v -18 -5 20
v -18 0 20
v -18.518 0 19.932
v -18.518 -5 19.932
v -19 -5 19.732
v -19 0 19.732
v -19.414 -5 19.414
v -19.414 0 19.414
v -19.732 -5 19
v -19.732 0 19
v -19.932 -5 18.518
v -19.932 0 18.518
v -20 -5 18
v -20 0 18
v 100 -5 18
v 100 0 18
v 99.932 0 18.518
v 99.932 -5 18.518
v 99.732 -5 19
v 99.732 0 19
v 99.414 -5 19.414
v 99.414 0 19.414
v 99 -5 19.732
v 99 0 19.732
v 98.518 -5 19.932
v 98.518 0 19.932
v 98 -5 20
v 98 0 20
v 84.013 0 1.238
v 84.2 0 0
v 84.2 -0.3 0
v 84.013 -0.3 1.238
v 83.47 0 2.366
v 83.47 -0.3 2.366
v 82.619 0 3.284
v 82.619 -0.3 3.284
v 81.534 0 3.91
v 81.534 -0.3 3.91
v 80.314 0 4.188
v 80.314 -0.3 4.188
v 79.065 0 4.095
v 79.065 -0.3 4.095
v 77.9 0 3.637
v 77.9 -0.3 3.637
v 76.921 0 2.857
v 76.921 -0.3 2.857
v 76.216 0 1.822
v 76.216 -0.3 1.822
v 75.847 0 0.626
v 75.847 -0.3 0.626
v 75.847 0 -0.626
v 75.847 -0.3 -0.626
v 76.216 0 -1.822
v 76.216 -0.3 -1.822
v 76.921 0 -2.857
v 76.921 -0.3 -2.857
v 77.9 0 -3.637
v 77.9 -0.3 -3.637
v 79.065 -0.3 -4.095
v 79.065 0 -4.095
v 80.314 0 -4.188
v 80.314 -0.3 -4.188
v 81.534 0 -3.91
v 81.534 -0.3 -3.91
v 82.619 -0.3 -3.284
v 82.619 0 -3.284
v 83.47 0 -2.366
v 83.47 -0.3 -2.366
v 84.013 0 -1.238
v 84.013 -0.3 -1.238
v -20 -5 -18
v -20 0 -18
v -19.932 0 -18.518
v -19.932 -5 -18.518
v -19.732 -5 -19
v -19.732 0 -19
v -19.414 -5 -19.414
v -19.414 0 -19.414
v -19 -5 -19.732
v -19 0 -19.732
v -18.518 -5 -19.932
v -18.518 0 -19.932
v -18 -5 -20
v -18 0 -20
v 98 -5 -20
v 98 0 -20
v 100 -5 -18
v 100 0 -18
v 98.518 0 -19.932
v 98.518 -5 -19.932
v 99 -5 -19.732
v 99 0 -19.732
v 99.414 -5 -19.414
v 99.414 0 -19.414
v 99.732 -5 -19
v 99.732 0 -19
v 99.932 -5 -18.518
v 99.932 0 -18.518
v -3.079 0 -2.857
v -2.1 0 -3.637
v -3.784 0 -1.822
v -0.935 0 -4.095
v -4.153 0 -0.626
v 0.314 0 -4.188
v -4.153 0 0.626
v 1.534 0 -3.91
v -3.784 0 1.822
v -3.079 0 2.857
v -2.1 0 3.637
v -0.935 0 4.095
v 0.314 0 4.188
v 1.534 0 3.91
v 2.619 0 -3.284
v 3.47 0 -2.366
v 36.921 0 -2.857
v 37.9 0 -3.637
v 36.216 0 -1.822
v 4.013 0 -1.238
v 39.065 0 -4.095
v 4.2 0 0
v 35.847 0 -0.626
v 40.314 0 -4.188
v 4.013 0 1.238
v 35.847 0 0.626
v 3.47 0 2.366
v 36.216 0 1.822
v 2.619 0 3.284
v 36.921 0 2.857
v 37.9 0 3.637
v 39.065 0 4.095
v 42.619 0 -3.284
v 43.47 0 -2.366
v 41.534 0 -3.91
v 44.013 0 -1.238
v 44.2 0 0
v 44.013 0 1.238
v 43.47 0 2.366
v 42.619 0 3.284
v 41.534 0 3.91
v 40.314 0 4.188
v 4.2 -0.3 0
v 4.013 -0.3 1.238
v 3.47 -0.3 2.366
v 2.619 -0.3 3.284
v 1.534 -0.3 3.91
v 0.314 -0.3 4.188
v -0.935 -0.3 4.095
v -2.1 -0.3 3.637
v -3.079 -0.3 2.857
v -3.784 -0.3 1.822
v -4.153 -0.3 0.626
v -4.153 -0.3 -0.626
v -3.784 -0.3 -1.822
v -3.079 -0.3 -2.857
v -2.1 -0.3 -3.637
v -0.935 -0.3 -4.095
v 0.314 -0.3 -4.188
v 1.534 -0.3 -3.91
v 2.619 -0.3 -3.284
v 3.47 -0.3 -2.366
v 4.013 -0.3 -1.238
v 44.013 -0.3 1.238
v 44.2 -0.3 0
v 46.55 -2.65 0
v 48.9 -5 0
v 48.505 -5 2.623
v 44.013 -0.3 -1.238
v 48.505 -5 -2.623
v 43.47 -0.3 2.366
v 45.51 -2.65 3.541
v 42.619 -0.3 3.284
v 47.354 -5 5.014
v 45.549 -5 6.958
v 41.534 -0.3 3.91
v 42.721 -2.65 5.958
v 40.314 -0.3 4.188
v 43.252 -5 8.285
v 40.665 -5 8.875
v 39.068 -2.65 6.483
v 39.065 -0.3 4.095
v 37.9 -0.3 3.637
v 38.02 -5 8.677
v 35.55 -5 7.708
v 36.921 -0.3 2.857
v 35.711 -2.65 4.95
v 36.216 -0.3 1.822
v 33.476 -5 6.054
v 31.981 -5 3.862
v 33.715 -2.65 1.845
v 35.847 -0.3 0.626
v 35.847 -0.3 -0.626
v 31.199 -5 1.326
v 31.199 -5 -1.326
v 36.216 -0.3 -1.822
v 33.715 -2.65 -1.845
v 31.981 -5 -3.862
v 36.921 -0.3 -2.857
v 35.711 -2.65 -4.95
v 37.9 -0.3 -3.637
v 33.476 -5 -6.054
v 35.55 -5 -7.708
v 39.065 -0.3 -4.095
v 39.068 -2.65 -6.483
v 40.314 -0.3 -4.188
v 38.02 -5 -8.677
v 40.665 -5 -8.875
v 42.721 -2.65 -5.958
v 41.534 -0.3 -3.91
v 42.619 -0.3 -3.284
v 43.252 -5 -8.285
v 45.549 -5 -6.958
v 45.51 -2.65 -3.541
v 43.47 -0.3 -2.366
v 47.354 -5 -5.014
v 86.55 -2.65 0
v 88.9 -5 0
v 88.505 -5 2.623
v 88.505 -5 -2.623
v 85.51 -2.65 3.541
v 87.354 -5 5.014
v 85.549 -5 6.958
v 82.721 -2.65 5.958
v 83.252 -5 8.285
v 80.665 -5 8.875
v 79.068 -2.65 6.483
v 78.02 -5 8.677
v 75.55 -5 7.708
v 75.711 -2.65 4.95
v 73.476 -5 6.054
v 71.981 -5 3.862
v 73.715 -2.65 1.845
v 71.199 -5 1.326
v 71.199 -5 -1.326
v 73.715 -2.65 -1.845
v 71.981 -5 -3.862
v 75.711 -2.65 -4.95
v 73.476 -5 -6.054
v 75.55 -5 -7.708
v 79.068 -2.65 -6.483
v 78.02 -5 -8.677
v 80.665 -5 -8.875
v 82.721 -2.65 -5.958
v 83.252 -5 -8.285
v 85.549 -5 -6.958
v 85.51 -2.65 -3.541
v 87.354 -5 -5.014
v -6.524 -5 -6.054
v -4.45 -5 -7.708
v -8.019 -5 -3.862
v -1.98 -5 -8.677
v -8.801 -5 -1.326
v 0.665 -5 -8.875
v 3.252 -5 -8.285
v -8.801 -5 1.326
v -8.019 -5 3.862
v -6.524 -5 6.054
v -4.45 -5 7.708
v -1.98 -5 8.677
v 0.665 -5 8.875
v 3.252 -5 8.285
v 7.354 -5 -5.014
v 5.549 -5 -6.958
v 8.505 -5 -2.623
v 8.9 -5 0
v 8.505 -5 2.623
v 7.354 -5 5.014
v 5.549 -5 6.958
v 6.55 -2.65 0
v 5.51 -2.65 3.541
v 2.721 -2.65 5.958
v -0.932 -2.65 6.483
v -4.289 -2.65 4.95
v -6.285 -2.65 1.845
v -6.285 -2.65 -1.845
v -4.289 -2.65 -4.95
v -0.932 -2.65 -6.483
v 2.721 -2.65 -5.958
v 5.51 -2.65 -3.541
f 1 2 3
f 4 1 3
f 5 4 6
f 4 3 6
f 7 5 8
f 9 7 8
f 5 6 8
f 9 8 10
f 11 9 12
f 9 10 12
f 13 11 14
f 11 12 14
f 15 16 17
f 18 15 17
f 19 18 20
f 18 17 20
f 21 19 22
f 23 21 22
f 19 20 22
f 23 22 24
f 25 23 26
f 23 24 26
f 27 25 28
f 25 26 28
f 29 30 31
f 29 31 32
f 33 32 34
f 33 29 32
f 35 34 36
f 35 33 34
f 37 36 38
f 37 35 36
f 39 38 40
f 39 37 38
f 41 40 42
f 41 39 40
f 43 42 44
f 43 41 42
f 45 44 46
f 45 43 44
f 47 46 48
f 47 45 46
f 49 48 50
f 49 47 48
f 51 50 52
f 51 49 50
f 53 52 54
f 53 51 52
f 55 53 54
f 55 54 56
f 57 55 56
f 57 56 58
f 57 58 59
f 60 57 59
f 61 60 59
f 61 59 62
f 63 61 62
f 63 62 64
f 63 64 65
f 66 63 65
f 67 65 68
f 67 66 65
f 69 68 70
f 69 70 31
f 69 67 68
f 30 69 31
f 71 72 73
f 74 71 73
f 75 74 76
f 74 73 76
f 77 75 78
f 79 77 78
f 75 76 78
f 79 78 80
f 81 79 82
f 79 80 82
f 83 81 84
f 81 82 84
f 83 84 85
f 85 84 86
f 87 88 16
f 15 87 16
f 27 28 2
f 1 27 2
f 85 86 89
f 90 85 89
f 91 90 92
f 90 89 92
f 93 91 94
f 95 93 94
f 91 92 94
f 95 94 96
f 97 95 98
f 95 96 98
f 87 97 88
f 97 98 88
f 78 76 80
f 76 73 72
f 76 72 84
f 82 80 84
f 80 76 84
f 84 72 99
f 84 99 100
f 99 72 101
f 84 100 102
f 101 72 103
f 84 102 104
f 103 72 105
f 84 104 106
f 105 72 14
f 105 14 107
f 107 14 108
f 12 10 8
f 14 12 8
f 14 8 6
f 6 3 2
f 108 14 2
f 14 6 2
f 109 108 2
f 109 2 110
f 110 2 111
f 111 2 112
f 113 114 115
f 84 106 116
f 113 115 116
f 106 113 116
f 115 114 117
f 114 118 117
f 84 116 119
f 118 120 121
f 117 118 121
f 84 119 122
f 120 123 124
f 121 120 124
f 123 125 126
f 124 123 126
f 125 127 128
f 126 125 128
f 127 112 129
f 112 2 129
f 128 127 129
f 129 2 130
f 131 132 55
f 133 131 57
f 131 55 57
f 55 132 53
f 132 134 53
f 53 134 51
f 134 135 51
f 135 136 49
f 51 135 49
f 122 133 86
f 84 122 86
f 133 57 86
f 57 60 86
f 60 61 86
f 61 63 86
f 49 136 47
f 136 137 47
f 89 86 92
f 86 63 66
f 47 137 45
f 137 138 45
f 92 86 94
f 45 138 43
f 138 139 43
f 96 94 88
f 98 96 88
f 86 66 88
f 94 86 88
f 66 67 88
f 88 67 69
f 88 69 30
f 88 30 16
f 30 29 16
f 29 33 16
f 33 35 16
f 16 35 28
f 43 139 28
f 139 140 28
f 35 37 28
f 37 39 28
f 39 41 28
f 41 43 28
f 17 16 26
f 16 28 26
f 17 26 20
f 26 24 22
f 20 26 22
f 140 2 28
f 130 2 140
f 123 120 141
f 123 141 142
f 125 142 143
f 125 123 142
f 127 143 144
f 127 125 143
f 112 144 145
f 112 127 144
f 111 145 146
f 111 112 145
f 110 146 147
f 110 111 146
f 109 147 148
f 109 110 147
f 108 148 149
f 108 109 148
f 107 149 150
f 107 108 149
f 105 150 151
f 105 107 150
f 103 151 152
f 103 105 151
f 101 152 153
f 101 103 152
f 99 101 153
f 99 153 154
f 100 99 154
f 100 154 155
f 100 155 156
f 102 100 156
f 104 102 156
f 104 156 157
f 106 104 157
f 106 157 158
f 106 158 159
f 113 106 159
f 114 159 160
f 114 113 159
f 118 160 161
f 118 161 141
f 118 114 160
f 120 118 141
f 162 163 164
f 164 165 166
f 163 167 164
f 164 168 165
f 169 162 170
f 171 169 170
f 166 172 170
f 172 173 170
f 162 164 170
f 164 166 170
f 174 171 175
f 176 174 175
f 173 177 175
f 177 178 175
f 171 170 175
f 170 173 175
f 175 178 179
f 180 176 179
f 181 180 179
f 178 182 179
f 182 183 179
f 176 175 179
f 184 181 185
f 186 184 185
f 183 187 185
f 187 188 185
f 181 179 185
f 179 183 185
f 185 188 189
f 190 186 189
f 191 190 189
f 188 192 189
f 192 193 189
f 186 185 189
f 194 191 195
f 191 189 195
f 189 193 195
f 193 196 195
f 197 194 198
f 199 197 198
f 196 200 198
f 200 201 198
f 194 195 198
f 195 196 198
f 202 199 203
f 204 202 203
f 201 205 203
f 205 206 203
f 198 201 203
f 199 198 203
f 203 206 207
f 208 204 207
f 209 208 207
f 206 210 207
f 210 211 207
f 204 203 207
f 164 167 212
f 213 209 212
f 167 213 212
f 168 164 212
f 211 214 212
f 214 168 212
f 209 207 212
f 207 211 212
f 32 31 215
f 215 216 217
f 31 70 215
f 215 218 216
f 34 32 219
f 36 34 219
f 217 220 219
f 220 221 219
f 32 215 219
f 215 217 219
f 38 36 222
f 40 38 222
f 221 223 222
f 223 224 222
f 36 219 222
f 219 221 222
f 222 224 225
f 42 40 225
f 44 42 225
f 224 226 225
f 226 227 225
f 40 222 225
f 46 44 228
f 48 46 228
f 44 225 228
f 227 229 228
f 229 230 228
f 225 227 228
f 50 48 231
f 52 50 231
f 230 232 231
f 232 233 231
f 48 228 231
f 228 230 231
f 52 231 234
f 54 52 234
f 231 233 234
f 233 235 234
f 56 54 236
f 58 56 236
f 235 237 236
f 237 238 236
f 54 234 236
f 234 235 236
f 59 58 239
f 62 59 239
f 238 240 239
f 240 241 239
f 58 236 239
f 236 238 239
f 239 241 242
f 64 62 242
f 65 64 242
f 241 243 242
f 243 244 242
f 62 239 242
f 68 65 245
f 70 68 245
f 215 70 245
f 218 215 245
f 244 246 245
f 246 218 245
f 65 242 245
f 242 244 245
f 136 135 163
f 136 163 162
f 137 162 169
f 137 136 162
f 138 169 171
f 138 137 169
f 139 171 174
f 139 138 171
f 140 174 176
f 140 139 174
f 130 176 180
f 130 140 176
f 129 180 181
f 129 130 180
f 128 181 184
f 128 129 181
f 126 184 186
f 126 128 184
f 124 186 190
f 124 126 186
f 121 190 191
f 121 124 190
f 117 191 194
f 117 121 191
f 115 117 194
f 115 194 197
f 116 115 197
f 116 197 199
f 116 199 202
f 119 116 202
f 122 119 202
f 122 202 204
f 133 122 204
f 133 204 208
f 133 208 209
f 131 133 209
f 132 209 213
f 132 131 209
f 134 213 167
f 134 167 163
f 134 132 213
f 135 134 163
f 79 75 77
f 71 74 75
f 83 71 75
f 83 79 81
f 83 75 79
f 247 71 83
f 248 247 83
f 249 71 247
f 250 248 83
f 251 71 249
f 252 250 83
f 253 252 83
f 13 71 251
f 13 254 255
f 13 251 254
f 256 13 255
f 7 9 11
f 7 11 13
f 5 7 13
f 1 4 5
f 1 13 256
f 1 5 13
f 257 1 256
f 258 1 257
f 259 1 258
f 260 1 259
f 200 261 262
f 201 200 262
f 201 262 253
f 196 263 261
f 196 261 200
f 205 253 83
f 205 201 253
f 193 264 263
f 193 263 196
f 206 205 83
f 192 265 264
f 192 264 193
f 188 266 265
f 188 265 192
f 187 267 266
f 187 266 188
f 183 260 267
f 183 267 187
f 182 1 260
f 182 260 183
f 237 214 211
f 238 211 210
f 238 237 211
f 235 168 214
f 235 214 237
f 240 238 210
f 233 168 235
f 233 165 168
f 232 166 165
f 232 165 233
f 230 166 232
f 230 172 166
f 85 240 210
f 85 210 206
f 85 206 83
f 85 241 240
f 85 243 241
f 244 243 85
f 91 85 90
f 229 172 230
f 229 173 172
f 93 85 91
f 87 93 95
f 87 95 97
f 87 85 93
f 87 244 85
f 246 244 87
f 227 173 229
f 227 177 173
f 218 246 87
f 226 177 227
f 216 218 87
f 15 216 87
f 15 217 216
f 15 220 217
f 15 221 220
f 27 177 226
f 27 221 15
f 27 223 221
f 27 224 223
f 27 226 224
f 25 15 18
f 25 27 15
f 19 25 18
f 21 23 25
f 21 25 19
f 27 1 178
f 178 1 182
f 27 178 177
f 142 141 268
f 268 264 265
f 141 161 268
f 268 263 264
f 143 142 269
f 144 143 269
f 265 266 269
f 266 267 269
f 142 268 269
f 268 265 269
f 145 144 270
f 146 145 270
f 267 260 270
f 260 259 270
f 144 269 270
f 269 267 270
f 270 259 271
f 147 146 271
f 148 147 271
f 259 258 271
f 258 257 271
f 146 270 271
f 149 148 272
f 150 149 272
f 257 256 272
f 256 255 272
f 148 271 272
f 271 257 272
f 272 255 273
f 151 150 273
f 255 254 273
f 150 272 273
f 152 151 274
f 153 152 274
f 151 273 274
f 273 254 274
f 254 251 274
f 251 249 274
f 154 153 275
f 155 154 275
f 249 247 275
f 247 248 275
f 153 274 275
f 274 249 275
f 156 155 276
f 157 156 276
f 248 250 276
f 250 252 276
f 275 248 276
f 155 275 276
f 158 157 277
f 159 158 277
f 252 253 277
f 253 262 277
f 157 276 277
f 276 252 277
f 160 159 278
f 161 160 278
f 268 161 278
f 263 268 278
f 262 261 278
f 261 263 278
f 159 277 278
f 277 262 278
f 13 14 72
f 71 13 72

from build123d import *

# Parameters (mm, degrees)
F0_R     = 4.2
F1_DEPTH = 5
F2_SIZE  = 4.7


# Not quite as in the source:
# - a feature names something its author has since deleted; it is built from what else it names


with BuildPart() as f1:
    # F0 (on Front) → F1 (new body)
    with BuildSketch(Plane.XZ):
        with BuildLine():
            Line((98, 20), (-18, 20))
            ThreePointArc((-18, 20), (-19.4142135624, 19.4142135624), (-20, 18))
            Line((-20, 18), (-20, -18))
            ThreePointArc((-20, -18), (-19.4142135624, -19.4142135624), (-18, -20))
            Line((-18, -20), (98, -20))
            ThreePointArc((98, -20), (99.4142135624, -19.4142135624), (100, -18))
            Line((100, -18), (100, 18))
            ThreePointArc((100, 18), (99.4142135624, 19.4142135624), (98, 20))
        make_face()
        Circle(F0_R, mode=Mode.SUBTRACT)
        with Locations((40, 0)):
            Circle(F0_R, mode=Mode.SUBTRACT)
        with Locations((80, 0)):
            Circle(F0_R, mode=Mode.SUBTRACT)
    extrude(amount=F1_DEPTH)

    # F2
    f2_edges = [f1.edges().sort_by_distance(p)[0] for p in [
        (-4.2, -5, 0),
        (35.8, -5, 0),
        (75.8, -5, 0),
    ]]
    chamfer(f2_edges, length=F2_SIZE)


solid = f1.part
